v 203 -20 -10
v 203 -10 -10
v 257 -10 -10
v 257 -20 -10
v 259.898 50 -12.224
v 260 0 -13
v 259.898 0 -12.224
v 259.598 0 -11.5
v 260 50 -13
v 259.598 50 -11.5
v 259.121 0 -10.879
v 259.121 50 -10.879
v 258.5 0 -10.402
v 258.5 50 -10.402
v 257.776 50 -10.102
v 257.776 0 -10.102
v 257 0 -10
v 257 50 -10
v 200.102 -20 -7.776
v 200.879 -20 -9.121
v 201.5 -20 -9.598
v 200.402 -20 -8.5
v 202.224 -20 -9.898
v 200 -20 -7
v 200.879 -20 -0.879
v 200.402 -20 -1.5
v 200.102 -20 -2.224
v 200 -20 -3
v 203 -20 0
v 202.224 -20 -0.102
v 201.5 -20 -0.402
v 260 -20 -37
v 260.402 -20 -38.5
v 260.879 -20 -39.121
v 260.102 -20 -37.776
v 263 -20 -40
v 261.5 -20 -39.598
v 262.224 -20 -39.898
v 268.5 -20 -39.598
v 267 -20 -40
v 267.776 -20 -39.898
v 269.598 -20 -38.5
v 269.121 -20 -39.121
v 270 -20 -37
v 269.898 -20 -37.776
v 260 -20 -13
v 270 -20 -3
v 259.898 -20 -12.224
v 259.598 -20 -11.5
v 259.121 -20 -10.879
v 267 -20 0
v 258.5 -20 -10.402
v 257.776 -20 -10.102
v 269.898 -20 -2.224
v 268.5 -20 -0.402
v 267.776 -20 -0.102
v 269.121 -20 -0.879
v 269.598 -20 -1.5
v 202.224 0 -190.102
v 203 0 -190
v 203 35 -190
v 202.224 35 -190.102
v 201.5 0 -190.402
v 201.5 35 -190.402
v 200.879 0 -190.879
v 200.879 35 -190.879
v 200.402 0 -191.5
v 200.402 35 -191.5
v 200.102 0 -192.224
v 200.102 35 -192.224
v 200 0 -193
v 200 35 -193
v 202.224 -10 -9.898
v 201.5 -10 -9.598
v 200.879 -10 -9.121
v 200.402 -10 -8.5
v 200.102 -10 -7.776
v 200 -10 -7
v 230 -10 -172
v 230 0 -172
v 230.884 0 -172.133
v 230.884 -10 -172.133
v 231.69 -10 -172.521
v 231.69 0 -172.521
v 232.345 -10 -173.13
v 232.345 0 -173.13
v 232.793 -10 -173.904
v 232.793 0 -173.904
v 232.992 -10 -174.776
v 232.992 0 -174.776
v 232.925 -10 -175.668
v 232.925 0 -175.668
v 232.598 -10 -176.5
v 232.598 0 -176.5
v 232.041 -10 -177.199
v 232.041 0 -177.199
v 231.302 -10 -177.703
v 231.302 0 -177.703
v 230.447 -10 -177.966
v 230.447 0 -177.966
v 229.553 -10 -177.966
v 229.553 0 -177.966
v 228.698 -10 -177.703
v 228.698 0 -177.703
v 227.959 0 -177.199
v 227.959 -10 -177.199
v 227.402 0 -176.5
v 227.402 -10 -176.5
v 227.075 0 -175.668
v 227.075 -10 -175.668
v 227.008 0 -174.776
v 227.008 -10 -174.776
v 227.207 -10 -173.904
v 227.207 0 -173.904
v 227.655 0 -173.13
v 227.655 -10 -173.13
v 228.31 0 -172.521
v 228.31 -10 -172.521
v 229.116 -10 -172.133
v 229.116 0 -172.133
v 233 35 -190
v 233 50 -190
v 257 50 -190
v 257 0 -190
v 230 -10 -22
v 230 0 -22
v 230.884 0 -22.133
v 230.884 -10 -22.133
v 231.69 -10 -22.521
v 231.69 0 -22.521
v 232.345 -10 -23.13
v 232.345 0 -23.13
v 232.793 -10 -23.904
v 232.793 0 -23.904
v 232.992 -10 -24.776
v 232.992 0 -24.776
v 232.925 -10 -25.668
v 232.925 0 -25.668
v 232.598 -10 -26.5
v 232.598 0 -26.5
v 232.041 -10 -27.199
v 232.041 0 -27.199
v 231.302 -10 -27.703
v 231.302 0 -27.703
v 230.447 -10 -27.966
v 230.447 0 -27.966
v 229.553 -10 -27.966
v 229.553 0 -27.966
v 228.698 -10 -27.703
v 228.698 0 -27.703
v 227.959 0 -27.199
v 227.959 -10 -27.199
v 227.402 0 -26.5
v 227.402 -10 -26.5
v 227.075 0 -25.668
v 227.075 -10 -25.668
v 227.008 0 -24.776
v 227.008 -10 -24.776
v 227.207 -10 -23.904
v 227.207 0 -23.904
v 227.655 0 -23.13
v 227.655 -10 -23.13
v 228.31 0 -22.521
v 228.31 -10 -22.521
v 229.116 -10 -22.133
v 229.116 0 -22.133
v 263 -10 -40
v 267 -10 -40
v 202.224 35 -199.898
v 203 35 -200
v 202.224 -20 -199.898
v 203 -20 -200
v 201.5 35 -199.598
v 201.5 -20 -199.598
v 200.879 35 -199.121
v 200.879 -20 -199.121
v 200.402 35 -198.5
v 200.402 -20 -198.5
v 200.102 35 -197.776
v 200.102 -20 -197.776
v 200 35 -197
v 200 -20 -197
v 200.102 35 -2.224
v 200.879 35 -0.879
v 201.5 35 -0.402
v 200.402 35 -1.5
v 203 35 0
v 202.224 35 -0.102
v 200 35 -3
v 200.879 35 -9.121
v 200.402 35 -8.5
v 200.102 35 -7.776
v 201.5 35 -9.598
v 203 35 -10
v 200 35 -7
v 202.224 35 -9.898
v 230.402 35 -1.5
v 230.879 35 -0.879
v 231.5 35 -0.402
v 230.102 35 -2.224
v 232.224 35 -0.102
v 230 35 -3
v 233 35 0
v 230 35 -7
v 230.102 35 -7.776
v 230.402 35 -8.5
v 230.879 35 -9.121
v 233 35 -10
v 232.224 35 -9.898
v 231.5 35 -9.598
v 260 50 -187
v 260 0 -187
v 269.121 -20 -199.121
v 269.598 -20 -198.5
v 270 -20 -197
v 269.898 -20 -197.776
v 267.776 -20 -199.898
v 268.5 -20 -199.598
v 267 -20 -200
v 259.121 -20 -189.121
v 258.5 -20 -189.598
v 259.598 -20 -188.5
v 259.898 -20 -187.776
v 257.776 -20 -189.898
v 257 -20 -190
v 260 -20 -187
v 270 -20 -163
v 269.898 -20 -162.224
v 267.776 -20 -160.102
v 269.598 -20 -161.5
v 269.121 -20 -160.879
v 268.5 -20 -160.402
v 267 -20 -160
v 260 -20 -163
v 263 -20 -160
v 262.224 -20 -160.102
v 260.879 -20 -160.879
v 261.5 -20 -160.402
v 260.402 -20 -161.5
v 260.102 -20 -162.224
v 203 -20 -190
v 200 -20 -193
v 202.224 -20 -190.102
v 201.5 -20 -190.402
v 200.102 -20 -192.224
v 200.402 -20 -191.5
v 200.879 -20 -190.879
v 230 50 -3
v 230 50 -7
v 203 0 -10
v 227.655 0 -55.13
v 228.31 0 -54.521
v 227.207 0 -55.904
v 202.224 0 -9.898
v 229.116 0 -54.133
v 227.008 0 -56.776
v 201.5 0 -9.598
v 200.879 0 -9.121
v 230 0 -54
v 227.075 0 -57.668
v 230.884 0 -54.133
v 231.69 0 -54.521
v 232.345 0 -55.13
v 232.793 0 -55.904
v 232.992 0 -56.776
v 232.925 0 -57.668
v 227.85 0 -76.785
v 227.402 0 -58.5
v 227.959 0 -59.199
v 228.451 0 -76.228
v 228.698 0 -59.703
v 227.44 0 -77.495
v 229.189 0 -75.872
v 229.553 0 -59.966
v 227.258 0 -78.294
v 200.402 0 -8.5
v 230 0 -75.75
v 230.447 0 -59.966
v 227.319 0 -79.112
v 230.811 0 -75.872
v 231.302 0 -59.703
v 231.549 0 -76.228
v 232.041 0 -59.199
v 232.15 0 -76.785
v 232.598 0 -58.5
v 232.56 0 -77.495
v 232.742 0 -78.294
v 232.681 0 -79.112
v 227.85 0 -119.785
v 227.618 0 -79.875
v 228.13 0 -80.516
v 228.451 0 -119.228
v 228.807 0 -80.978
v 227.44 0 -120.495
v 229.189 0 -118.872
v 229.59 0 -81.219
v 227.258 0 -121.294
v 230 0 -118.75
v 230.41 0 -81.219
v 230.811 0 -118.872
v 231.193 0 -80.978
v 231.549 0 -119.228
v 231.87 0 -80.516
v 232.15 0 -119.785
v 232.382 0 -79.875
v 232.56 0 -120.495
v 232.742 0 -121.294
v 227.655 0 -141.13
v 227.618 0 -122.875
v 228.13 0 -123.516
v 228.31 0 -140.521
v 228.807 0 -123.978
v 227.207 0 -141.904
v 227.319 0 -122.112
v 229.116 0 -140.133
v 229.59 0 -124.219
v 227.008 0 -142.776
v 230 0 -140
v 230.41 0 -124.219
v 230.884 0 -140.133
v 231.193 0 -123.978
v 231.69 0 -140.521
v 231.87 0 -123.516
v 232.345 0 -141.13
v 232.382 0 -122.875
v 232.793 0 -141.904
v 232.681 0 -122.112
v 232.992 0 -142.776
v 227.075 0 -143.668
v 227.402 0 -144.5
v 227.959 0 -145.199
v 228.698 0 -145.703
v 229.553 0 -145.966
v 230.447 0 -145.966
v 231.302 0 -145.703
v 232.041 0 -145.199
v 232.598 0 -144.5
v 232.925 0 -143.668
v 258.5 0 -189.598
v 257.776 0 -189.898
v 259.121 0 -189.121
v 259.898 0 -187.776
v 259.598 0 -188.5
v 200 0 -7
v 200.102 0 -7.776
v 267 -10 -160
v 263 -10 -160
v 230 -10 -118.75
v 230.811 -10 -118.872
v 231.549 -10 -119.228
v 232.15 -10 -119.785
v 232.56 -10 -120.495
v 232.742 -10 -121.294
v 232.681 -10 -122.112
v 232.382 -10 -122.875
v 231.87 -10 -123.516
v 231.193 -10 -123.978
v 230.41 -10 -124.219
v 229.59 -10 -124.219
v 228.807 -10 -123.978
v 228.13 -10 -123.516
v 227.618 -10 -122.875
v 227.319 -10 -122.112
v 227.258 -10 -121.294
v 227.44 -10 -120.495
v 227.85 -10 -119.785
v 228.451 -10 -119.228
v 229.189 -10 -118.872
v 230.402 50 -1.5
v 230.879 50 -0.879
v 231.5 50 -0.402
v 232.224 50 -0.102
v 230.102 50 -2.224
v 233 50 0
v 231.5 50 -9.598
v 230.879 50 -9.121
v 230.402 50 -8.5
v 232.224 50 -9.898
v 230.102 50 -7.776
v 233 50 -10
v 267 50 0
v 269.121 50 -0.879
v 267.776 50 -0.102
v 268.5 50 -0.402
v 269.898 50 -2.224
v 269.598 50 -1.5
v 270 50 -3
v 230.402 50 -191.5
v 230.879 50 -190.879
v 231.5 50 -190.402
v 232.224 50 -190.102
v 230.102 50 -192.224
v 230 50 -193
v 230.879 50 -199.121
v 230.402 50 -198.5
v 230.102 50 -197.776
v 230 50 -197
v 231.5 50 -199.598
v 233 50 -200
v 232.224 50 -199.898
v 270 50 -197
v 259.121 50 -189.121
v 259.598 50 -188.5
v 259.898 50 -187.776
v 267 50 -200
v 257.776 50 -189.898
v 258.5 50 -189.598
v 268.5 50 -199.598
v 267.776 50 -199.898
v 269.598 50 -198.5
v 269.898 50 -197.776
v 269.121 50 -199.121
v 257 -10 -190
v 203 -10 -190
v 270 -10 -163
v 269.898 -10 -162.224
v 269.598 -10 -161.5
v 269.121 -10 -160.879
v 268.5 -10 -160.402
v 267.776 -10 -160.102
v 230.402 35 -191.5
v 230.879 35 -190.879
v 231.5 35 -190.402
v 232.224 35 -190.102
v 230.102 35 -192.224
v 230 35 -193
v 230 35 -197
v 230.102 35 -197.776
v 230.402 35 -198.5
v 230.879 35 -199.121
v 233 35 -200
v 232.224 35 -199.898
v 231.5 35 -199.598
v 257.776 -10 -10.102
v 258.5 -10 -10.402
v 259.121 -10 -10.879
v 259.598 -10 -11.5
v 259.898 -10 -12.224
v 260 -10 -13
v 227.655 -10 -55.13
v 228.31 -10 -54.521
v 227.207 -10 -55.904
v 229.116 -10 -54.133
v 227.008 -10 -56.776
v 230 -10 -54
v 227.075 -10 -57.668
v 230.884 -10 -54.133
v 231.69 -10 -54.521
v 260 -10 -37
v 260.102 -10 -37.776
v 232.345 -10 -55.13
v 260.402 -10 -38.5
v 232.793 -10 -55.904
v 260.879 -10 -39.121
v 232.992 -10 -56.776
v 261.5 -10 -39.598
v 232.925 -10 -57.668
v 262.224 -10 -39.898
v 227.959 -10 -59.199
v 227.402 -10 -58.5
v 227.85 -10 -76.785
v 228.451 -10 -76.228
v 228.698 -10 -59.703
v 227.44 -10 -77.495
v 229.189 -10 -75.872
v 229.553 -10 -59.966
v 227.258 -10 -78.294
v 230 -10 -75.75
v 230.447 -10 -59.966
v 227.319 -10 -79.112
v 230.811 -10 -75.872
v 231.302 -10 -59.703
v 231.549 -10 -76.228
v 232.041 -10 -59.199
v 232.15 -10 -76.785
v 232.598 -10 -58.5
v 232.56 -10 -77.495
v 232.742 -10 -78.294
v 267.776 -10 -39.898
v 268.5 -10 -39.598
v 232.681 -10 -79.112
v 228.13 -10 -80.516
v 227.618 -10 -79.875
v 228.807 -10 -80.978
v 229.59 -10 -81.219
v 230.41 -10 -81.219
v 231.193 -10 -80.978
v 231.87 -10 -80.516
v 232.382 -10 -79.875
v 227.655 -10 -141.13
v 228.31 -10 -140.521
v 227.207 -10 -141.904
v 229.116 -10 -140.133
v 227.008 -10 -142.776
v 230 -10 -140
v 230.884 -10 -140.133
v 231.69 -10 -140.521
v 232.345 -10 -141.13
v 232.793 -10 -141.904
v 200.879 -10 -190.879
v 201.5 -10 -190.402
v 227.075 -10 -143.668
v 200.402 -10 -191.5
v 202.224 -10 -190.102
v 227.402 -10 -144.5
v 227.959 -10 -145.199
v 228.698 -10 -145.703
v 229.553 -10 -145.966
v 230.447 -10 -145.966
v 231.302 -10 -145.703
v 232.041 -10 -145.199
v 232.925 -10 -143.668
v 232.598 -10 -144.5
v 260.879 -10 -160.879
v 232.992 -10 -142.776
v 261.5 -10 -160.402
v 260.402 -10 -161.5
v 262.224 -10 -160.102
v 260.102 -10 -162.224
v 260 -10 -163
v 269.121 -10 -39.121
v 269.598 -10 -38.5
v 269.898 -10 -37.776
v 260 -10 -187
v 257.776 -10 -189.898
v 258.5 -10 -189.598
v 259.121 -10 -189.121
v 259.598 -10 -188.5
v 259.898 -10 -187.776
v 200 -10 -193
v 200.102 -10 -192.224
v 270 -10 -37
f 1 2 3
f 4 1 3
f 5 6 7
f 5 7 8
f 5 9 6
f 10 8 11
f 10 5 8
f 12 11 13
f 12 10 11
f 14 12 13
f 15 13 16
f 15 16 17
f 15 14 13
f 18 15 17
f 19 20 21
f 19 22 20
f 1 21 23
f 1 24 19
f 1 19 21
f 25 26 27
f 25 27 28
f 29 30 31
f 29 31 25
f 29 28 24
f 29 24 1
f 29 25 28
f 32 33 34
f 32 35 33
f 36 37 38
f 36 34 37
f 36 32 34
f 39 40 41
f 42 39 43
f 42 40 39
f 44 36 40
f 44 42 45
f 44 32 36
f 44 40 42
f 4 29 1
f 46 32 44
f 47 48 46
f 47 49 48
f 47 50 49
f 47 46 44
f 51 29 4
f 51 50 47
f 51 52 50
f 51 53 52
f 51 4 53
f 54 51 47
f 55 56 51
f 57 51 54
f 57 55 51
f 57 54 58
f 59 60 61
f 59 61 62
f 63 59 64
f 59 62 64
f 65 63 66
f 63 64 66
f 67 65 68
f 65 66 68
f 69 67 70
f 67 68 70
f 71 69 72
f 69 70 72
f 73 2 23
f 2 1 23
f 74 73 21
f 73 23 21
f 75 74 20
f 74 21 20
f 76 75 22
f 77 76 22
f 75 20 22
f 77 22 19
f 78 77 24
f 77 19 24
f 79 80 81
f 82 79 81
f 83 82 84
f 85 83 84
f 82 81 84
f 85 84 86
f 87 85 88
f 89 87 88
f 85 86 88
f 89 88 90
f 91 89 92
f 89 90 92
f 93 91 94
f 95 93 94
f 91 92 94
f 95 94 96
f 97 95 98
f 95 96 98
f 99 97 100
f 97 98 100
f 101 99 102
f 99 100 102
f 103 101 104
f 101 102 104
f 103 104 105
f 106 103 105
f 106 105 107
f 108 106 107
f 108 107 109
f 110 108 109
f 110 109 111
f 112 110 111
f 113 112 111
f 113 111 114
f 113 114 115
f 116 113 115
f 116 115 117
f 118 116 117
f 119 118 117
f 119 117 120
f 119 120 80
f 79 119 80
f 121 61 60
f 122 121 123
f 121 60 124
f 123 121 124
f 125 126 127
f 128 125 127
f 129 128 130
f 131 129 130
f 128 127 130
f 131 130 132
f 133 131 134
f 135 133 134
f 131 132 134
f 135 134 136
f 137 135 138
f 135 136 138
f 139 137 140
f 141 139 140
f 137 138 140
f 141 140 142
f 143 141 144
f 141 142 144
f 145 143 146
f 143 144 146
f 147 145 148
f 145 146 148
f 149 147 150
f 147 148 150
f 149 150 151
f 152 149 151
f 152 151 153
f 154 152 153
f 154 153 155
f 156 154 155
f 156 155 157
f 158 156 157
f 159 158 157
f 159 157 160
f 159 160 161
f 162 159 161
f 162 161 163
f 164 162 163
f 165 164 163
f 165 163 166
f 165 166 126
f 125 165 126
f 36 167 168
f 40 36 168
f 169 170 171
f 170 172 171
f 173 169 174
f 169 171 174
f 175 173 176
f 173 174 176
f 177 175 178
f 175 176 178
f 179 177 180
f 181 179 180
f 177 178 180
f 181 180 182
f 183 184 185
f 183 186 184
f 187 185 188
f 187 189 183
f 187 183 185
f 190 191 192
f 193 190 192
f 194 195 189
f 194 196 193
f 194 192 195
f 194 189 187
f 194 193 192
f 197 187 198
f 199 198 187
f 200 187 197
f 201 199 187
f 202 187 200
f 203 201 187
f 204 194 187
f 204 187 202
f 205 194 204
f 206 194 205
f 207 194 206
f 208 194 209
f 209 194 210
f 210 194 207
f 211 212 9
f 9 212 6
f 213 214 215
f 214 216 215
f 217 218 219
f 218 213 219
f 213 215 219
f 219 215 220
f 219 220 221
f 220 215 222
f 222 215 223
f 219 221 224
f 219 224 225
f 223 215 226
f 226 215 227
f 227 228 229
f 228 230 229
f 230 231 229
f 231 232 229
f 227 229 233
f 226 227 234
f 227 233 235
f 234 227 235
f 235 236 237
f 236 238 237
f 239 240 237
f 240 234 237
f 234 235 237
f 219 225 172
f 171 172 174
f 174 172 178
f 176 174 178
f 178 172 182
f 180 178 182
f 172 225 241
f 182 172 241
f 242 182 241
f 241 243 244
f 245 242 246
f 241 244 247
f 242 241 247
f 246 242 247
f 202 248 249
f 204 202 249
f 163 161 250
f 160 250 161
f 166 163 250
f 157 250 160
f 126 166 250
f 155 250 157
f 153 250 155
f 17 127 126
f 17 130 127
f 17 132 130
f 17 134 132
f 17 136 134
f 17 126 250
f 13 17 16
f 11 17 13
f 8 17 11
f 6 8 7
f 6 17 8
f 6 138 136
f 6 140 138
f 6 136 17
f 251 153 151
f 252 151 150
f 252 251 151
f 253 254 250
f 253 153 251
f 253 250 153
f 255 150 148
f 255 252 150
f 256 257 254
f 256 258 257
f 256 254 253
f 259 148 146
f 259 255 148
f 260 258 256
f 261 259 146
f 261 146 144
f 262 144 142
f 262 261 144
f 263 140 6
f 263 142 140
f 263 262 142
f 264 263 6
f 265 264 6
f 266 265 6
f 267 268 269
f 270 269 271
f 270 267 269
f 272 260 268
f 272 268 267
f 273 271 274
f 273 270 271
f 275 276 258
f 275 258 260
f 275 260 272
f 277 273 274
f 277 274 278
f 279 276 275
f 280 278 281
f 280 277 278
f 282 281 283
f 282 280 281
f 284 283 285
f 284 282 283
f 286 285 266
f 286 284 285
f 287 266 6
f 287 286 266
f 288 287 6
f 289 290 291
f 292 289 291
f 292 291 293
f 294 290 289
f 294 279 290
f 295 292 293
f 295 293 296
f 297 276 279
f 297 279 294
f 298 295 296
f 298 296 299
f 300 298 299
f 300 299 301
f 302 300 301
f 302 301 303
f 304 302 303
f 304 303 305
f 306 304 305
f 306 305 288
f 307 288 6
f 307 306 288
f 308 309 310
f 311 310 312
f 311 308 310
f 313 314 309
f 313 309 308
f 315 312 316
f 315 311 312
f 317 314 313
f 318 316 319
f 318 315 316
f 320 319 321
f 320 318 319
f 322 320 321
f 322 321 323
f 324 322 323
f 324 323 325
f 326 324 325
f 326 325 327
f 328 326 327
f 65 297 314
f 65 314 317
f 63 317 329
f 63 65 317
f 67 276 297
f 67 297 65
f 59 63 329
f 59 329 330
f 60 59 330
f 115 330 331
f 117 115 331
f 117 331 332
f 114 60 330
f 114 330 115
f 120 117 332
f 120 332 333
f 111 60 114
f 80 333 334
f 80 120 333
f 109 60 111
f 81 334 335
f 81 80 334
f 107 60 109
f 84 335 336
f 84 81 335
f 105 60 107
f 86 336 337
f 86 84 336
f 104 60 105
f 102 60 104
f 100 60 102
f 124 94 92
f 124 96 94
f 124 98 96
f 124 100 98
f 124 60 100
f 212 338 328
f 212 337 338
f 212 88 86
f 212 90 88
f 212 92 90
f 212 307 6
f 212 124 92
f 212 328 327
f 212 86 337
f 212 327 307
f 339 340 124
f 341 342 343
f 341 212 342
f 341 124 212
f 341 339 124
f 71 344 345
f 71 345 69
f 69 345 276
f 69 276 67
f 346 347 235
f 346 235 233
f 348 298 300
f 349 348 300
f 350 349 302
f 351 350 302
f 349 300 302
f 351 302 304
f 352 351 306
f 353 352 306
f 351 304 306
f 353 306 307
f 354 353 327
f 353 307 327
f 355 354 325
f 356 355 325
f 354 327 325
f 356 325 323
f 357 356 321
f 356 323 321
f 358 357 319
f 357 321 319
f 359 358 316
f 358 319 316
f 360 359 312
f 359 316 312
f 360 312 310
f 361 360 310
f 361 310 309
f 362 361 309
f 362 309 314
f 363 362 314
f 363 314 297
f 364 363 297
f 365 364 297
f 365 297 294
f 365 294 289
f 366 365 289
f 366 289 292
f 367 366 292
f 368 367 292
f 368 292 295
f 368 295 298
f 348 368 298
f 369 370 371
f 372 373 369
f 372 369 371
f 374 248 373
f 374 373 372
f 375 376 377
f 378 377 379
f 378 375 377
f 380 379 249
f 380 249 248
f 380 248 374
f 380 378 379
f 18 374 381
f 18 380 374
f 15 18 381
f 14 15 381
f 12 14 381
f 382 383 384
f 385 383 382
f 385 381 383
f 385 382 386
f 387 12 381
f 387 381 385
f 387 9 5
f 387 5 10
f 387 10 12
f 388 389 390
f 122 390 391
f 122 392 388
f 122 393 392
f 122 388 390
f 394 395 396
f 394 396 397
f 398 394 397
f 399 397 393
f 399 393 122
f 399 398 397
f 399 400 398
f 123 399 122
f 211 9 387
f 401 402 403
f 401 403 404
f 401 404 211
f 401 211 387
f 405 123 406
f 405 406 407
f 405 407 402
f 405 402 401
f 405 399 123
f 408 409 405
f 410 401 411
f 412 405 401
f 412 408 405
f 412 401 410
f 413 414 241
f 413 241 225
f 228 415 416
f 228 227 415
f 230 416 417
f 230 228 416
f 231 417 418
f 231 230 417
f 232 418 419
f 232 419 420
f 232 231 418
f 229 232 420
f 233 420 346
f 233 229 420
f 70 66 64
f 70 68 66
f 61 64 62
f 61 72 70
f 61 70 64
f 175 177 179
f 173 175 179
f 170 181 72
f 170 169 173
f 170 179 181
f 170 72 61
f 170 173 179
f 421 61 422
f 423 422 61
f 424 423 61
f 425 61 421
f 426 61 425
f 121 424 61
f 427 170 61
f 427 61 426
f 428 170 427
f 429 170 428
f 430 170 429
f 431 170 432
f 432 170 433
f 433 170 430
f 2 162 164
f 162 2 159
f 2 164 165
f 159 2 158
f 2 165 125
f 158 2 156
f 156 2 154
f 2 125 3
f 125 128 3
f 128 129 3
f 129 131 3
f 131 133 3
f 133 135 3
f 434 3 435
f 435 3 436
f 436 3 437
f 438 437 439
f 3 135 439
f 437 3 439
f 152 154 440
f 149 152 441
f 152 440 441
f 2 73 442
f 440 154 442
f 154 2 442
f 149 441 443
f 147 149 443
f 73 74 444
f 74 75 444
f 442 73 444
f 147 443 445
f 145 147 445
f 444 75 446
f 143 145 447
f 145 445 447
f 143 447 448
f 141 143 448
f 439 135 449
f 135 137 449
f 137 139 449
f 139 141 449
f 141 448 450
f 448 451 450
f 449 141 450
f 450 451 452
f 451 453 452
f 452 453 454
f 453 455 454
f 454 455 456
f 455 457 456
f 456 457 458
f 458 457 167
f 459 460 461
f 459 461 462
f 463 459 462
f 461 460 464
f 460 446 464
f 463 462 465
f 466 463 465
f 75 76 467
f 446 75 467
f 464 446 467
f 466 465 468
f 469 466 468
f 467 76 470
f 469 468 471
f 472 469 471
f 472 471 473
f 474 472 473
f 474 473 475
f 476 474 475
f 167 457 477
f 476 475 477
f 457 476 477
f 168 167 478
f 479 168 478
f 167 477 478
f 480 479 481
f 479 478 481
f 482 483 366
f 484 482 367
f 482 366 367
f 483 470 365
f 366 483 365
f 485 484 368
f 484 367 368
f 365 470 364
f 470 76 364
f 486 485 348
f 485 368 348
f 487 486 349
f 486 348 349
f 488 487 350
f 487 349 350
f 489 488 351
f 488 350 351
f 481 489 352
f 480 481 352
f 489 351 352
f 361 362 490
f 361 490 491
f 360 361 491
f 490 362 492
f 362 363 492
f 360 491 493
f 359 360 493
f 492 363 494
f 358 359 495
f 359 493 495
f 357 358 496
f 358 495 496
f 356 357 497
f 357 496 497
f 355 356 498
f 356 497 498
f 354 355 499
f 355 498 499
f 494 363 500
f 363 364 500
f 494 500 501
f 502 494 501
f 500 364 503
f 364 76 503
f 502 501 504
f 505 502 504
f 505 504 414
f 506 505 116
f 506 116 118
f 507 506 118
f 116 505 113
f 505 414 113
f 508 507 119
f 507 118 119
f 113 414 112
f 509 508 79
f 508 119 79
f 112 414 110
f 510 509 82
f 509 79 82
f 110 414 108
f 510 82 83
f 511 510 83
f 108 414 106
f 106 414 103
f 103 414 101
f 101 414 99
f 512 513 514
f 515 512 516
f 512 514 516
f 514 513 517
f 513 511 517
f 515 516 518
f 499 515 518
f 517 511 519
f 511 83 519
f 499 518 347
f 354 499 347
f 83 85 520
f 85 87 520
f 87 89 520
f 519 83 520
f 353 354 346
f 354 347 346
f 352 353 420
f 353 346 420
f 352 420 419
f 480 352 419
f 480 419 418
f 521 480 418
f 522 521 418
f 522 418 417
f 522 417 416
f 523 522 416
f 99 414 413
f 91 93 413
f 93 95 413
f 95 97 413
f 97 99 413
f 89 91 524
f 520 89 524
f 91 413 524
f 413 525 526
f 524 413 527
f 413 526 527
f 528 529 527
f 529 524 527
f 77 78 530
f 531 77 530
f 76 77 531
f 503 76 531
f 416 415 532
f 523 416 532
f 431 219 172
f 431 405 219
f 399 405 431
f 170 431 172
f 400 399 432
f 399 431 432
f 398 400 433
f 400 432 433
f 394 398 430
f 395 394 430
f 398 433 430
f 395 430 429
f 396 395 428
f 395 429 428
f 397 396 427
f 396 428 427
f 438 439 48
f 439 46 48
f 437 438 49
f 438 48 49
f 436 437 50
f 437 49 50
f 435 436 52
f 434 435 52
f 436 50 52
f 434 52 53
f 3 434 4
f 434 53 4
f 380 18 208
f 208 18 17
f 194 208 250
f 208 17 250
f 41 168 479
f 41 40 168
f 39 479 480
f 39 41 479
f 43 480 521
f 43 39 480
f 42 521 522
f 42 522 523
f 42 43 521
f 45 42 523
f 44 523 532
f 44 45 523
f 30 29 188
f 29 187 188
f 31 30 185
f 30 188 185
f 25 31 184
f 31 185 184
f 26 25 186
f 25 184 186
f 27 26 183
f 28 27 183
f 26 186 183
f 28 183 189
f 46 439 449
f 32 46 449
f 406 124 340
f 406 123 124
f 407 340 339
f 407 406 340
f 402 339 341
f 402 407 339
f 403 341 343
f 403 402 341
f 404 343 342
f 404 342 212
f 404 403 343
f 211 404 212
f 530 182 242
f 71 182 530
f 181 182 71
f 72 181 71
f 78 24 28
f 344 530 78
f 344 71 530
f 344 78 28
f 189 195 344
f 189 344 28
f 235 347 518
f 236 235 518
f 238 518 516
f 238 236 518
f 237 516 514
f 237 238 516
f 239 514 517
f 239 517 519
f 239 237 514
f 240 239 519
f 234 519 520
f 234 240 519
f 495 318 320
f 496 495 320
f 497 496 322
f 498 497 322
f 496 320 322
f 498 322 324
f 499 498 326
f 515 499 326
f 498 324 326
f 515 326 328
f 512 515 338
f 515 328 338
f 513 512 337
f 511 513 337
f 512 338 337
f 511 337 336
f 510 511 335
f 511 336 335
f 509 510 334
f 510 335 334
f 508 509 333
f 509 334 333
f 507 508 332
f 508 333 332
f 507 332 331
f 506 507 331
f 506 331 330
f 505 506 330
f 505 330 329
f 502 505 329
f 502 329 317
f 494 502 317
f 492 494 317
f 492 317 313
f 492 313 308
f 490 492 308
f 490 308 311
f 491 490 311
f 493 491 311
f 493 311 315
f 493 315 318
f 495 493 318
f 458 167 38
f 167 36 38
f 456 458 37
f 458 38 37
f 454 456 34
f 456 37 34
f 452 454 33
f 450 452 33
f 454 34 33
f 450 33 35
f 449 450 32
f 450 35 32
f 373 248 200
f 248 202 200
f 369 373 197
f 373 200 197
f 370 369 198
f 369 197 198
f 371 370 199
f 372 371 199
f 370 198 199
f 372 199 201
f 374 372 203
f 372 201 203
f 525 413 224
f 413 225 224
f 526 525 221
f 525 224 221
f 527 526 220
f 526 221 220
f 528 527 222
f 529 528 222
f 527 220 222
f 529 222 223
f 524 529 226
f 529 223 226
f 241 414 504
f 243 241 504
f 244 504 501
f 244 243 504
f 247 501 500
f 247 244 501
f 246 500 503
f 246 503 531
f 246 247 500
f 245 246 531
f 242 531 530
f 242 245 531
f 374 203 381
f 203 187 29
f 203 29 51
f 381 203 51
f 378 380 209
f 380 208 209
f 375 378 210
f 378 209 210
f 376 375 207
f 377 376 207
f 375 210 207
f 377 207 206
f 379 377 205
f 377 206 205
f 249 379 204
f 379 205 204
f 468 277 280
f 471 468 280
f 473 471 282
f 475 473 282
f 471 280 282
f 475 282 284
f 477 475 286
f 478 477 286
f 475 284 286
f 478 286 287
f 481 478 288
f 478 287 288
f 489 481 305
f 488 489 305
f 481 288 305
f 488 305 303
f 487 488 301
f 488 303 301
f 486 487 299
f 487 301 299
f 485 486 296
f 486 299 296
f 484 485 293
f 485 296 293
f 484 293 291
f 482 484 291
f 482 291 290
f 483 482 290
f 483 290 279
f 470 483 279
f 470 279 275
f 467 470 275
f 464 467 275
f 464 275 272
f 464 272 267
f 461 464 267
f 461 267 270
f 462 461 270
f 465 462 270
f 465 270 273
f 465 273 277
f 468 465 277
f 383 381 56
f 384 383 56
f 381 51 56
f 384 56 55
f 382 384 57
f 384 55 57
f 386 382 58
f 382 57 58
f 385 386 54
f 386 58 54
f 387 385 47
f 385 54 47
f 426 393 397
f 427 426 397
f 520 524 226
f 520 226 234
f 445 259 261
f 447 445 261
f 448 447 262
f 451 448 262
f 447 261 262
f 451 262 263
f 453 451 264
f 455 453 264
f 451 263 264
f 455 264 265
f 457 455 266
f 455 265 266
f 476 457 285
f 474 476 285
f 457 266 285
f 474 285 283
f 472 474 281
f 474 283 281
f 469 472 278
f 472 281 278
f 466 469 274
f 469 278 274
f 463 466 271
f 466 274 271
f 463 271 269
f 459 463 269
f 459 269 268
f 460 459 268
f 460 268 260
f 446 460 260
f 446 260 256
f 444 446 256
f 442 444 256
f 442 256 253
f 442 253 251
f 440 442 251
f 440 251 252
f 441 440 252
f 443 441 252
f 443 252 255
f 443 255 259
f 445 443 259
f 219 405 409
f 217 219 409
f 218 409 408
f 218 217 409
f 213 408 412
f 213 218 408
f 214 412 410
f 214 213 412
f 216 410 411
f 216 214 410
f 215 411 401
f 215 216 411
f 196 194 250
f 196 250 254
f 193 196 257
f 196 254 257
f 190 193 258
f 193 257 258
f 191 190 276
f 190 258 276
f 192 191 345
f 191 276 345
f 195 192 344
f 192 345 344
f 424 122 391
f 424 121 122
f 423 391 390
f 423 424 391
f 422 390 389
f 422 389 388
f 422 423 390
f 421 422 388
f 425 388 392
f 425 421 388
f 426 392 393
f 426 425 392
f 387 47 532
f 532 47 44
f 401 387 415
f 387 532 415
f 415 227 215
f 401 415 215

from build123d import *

# Parameters (mm, degrees)
SKETCH1_W           = 270
SKETCH1_H           = 200
BOSS_EXTRUDE1_DEPTH = 10
SKETCH10_W          = 40
SKETCH10_H          = 50
CUT_EXTRUDE1_DEPTH  = 5
SKETCH10_3_W        = 40
SKETCH10_3_H        = 50
BOSS_EXTRUDE2_DEPTH = 5
SKETCH12_R          = 3
CUT_EXTRUDE2_DEPTH  = 5
SKETCH12_3_R        = 3
CUT_EXTRUDE3_DEPTH  = 5
BOSS_EXTRUDE3_DEPTH = 50
CUT_EXTRUDE4_REACH  = 341.706
SKETCH15_R          = 2.75
CUT_EXTRUDE5_REACH  = 341.706
SKETCH16_R          = 3
SKETCH17_W          = 230
SKETCH17_H          = 10
CUT_EXTRUDE6_DEPTH  = 15
CUT_EXTRUDE7_REACH  = 341.006
SKETCH18_W          = 240
SKETCH18_H          = 200
BOSS_EXTRUDE4_DEPTH = 10
FILLET1_R           = 3


with BuildPart() as part:
    # Sketch1 → Boss-Extrude1 (new body)
    with BuildSketch(Plane(origin=(0, 0, 0), x_dir=(1, 0, 0), z_dir=(0, 1, 0))):
        with Locations((135, 100)):
            Rectangle(SKETCH1_W, SKETCH1_H)
    extrude(amount=-BOSS_EXTRUDE1_DEPTH)

    # Sketch10 → Cut-Extrude1 (cut)
    with BuildSketch(Plane(origin=(0, 0, 0), x_dir=(1, 0, 0), z_dir=(0, 1, 0))):
        with Locations((20, 150)):
            Rectangle(SKETCH10_W, SKETCH10_H)
    extrude(amount=-CUT_EXTRUDE1_DEPTH, mode=Mode.SUBTRACT)

    # Sketch10<3> → Boss-Extrude2 (add)
    with BuildSketch(Plane(origin=(0, 0, 0), x_dir=(1, 0, 0), z_dir=(0, 1, 0))):
        with Locations((-20, 50)):
            Rectangle(SKETCH10_3_W, SKETCH10_3_H)
    extrude(amount=-BOSS_EXTRUDE2_DEPTH)

    # Sketch12 → Cut-Extrude2 (cut)
    with BuildSketch(Plane(origin=(0, -5, 0), x_dir=(1, 0, 0), z_dir=(0, 1, 0))):
        with Locations((25, 150)):
            Circle(SKETCH12_R)
    extrude(amount=-CUT_EXTRUDE2_DEPTH, mode=Mode.SUBTRACT)

    # Sketch12<3> → Cut-Extrude3 (cut)
    with BuildSketch(Plane(origin=(0, -5, 0), x_dir=(1, 0, 0), z_dir=(0, 1, 0))):
        with Locations((-25, 50)):
            Circle(SKETCH12_3_R)
    extrude(amount=CUT_EXTRUDE3_DEPTH, mode=Mode.SUBTRACT)

    # Sketch13 → Boss-Extrude3 (add)
    with BuildSketch(Plane(origin=(0, 0, 0), x_dir=(1, 0, 0), z_dir=(0, 1, 0))):
        Polygon((0, 190), (260, 190), (260, 10), (0, 10), (0, 0), (270, 0), (270, 200), (0, 200), align=None)
    extrude(amount=BOSS_EXTRUDE3_DEPTH)

    # Sketch15 → Cut-Extrude4 (cut, up to next)
    with BuildSketch(Plane(origin=(0, 0, 0), x_dir=(1, 0, 0), z_dir=(0, 1, 0)), mode=Mode.PRIVATE) as cut_extrude4_sk1:
        with Locations((230, 78.5)):
            Circle(SKETCH15_R)
    cut_extrude4_tool1 = extrude(cut_extrude4_sk1.sketch, amount=-CUT_EXTRUDE4_REACH, mode=Mode.PRIVATE) & part.part
    # Sketch15 → Cut-Extrude4 (cut, up to next)
    with BuildSketch(Plane(origin=(0, 0, 0), x_dir=(1, 0, 0), z_dir=(0, 1, 0)), mode=Mode.PRIVATE) as cut_extrude4_sk2:
        with Locations((230, 121.5)):
            Circle(SKETCH15_R)
    cut_extrude4_tool2 = extrude(cut_extrude4_sk2.sketch, amount=-CUT_EXTRUDE4_REACH, mode=Mode.PRIVATE) & part.part
    add(cut_extrude4_tool1.solids().sort_by_distance((230, 0, -78.5))[0], mode=Mode.SUBTRACT)
    add(cut_extrude4_tool2.solids().sort_by_distance((230, 0, -121.5))[0], mode=Mode.SUBTRACT)

    # Sketch16 → Cut-Extrude5 (cut, up to next)
    with BuildSketch(Plane(origin=(0, 0, 0), x_dir=(1, 0, 0), z_dir=(0, 1, 0)), mode=Mode.PRIVATE) as cut_extrude5_sk1:
        with Locations((230, 143)):
            Circle(SKETCH16_R)
    cut_extrude5_tool1 = extrude(cut_extrude5_sk1.sketch, amount=-CUT_EXTRUDE5_REACH, mode=Mode.PRIVATE) & part.part
    # Sketch16 → Cut-Extrude5 (cut, up to next)
    with BuildSketch(Plane(origin=(0, 0, 0), x_dir=(1, 0, 0), z_dir=(0, 1, 0)), mode=Mode.PRIVATE) as cut_extrude5_sk2:
        with Locations((230, 175)):
            Circle(SKETCH16_R)
    cut_extrude5_tool2 = extrude(cut_extrude5_sk2.sketch, amount=-CUT_EXTRUDE5_REACH, mode=Mode.PRIVATE) & part.part
    # Sketch16 → Cut-Extrude5 (cut, up to next)
    with BuildSketch(Plane(origin=(0, 0, 0), x_dir=(1, 0, 0), z_dir=(0, 1, 0)), mode=Mode.PRIVATE) as cut_extrude5_sk3:
        with Locations((230, 57)):
            Circle(SKETCH16_R)
    cut_extrude5_tool3 = extrude(cut_extrude5_sk3.sketch, amount=-CUT_EXTRUDE5_REACH, mode=Mode.PRIVATE) & part.part
    # Sketch16 → Cut-Extrude5 (cut, up to next)
    with BuildSketch(Plane(origin=(0, 0, 0), x_dir=(1, 0, 0), z_dir=(0, 1, 0)), mode=Mode.PRIVATE) as cut_extrude5_sk4:
        with Locations((230, 25)):
            Circle(SKETCH16_R)
    cut_extrude5_tool4 = extrude(cut_extrude5_sk4.sketch, amount=-CUT_EXTRUDE5_REACH, mode=Mode.PRIVATE) & part.part
    add(cut_extrude5_tool1.solids().sort_by_distance((230, 0, -143))[0], mode=Mode.SUBTRACT)
    add(cut_extrude5_tool2.solids().sort_by_distance((230, 0, -175))[0], mode=Mode.SUBTRACT)
    add(cut_extrude5_tool3.solids().sort_by_distance((230, 0, -57))[0], mode=Mode.SUBTRACT)
    add(cut_extrude5_tool4.solids().sort_by_distance((230, 0, -25))[0], mode=Mode.SUBTRACT)

    # Sketch17 → Cut-Extrude6 (cut)
    with BuildSketch(Plane(origin=(0, 50, 0), x_dir=(1, 0, 0), z_dir=(0, 1, 0))):
        with Locations((115, 5)):
            Rectangle(SKETCH17_W, SKETCH17_H)
        with Locations((115, 195)):
            Rectangle(SKETCH17_W, SKETCH17_H)
    extrude(amount=-CUT_EXTRUDE6_DEPTH, mode=Mode.SUBTRACT)

    # Sketch18 → Cut-Extrude7 (cut, up to next)
    with BuildSketch(Plane(origin=(0, 35, 0), x_dir=(1, 0, 0), z_dir=(0, 1, 0)), mode=Mode.PRIVATE) as cut_extrude7_sk1:
        with Locations((80, 100)):
            Rectangle(SKETCH18_W, SKETCH18_H)
    cut_extrude7_tool1 = extrude(cut_extrude7_sk1.sketch, amount=-CUT_EXTRUDE7_REACH, mode=Mode.PRIVATE) & part.part
    add(cut_extrude7_tool1.solids().sort_by_distance((80, 35, -100))[0], mode=Mode.SUBTRACT)

    # Sketch14 → Boss-Extrude4 (add)
    with BuildSketch(Plane.XZ.offset(10)):
        Polygon((200, -190), (260, -190), (260, -160), (270, -160), (270, -200), (200, -200), align=None)
        Polygon((270, 0), (200, 0), (200, -10), (260, -10), (260, -40), (270, -40), align=None)
    extrude(amount=BOSS_EXTRUDE4_DEPTH)

    # Fillet1
    fillet1_edges = [part.edges().sort_by_distance(p)[0] for p in [
        (200, 7.5, 0),
        (200, -15, -10),
        (260, -15, -10),
        (260, -15, -40),
        (270, -15, -40),
        (260, -15, -160),
        (270, -15, -160),
        (270, 15, -200),
        (200, 7.5, -200),
        (200, -15, -190),
        (260, -15, -190),
        (200, 17.5, -10),
        (230, 42.5, 0),
        (230, 42.5, -10),
        (260, 25, -10),
        (260, 25, -190),
        (230, 42.5, -200),
        (230, 42.5, -190),
        (200, 17.5, -190),
        (270, 15, 0),
    ]]
    fillet(fillet1_edges, radius=FILLET1_R)


solid = part.part
